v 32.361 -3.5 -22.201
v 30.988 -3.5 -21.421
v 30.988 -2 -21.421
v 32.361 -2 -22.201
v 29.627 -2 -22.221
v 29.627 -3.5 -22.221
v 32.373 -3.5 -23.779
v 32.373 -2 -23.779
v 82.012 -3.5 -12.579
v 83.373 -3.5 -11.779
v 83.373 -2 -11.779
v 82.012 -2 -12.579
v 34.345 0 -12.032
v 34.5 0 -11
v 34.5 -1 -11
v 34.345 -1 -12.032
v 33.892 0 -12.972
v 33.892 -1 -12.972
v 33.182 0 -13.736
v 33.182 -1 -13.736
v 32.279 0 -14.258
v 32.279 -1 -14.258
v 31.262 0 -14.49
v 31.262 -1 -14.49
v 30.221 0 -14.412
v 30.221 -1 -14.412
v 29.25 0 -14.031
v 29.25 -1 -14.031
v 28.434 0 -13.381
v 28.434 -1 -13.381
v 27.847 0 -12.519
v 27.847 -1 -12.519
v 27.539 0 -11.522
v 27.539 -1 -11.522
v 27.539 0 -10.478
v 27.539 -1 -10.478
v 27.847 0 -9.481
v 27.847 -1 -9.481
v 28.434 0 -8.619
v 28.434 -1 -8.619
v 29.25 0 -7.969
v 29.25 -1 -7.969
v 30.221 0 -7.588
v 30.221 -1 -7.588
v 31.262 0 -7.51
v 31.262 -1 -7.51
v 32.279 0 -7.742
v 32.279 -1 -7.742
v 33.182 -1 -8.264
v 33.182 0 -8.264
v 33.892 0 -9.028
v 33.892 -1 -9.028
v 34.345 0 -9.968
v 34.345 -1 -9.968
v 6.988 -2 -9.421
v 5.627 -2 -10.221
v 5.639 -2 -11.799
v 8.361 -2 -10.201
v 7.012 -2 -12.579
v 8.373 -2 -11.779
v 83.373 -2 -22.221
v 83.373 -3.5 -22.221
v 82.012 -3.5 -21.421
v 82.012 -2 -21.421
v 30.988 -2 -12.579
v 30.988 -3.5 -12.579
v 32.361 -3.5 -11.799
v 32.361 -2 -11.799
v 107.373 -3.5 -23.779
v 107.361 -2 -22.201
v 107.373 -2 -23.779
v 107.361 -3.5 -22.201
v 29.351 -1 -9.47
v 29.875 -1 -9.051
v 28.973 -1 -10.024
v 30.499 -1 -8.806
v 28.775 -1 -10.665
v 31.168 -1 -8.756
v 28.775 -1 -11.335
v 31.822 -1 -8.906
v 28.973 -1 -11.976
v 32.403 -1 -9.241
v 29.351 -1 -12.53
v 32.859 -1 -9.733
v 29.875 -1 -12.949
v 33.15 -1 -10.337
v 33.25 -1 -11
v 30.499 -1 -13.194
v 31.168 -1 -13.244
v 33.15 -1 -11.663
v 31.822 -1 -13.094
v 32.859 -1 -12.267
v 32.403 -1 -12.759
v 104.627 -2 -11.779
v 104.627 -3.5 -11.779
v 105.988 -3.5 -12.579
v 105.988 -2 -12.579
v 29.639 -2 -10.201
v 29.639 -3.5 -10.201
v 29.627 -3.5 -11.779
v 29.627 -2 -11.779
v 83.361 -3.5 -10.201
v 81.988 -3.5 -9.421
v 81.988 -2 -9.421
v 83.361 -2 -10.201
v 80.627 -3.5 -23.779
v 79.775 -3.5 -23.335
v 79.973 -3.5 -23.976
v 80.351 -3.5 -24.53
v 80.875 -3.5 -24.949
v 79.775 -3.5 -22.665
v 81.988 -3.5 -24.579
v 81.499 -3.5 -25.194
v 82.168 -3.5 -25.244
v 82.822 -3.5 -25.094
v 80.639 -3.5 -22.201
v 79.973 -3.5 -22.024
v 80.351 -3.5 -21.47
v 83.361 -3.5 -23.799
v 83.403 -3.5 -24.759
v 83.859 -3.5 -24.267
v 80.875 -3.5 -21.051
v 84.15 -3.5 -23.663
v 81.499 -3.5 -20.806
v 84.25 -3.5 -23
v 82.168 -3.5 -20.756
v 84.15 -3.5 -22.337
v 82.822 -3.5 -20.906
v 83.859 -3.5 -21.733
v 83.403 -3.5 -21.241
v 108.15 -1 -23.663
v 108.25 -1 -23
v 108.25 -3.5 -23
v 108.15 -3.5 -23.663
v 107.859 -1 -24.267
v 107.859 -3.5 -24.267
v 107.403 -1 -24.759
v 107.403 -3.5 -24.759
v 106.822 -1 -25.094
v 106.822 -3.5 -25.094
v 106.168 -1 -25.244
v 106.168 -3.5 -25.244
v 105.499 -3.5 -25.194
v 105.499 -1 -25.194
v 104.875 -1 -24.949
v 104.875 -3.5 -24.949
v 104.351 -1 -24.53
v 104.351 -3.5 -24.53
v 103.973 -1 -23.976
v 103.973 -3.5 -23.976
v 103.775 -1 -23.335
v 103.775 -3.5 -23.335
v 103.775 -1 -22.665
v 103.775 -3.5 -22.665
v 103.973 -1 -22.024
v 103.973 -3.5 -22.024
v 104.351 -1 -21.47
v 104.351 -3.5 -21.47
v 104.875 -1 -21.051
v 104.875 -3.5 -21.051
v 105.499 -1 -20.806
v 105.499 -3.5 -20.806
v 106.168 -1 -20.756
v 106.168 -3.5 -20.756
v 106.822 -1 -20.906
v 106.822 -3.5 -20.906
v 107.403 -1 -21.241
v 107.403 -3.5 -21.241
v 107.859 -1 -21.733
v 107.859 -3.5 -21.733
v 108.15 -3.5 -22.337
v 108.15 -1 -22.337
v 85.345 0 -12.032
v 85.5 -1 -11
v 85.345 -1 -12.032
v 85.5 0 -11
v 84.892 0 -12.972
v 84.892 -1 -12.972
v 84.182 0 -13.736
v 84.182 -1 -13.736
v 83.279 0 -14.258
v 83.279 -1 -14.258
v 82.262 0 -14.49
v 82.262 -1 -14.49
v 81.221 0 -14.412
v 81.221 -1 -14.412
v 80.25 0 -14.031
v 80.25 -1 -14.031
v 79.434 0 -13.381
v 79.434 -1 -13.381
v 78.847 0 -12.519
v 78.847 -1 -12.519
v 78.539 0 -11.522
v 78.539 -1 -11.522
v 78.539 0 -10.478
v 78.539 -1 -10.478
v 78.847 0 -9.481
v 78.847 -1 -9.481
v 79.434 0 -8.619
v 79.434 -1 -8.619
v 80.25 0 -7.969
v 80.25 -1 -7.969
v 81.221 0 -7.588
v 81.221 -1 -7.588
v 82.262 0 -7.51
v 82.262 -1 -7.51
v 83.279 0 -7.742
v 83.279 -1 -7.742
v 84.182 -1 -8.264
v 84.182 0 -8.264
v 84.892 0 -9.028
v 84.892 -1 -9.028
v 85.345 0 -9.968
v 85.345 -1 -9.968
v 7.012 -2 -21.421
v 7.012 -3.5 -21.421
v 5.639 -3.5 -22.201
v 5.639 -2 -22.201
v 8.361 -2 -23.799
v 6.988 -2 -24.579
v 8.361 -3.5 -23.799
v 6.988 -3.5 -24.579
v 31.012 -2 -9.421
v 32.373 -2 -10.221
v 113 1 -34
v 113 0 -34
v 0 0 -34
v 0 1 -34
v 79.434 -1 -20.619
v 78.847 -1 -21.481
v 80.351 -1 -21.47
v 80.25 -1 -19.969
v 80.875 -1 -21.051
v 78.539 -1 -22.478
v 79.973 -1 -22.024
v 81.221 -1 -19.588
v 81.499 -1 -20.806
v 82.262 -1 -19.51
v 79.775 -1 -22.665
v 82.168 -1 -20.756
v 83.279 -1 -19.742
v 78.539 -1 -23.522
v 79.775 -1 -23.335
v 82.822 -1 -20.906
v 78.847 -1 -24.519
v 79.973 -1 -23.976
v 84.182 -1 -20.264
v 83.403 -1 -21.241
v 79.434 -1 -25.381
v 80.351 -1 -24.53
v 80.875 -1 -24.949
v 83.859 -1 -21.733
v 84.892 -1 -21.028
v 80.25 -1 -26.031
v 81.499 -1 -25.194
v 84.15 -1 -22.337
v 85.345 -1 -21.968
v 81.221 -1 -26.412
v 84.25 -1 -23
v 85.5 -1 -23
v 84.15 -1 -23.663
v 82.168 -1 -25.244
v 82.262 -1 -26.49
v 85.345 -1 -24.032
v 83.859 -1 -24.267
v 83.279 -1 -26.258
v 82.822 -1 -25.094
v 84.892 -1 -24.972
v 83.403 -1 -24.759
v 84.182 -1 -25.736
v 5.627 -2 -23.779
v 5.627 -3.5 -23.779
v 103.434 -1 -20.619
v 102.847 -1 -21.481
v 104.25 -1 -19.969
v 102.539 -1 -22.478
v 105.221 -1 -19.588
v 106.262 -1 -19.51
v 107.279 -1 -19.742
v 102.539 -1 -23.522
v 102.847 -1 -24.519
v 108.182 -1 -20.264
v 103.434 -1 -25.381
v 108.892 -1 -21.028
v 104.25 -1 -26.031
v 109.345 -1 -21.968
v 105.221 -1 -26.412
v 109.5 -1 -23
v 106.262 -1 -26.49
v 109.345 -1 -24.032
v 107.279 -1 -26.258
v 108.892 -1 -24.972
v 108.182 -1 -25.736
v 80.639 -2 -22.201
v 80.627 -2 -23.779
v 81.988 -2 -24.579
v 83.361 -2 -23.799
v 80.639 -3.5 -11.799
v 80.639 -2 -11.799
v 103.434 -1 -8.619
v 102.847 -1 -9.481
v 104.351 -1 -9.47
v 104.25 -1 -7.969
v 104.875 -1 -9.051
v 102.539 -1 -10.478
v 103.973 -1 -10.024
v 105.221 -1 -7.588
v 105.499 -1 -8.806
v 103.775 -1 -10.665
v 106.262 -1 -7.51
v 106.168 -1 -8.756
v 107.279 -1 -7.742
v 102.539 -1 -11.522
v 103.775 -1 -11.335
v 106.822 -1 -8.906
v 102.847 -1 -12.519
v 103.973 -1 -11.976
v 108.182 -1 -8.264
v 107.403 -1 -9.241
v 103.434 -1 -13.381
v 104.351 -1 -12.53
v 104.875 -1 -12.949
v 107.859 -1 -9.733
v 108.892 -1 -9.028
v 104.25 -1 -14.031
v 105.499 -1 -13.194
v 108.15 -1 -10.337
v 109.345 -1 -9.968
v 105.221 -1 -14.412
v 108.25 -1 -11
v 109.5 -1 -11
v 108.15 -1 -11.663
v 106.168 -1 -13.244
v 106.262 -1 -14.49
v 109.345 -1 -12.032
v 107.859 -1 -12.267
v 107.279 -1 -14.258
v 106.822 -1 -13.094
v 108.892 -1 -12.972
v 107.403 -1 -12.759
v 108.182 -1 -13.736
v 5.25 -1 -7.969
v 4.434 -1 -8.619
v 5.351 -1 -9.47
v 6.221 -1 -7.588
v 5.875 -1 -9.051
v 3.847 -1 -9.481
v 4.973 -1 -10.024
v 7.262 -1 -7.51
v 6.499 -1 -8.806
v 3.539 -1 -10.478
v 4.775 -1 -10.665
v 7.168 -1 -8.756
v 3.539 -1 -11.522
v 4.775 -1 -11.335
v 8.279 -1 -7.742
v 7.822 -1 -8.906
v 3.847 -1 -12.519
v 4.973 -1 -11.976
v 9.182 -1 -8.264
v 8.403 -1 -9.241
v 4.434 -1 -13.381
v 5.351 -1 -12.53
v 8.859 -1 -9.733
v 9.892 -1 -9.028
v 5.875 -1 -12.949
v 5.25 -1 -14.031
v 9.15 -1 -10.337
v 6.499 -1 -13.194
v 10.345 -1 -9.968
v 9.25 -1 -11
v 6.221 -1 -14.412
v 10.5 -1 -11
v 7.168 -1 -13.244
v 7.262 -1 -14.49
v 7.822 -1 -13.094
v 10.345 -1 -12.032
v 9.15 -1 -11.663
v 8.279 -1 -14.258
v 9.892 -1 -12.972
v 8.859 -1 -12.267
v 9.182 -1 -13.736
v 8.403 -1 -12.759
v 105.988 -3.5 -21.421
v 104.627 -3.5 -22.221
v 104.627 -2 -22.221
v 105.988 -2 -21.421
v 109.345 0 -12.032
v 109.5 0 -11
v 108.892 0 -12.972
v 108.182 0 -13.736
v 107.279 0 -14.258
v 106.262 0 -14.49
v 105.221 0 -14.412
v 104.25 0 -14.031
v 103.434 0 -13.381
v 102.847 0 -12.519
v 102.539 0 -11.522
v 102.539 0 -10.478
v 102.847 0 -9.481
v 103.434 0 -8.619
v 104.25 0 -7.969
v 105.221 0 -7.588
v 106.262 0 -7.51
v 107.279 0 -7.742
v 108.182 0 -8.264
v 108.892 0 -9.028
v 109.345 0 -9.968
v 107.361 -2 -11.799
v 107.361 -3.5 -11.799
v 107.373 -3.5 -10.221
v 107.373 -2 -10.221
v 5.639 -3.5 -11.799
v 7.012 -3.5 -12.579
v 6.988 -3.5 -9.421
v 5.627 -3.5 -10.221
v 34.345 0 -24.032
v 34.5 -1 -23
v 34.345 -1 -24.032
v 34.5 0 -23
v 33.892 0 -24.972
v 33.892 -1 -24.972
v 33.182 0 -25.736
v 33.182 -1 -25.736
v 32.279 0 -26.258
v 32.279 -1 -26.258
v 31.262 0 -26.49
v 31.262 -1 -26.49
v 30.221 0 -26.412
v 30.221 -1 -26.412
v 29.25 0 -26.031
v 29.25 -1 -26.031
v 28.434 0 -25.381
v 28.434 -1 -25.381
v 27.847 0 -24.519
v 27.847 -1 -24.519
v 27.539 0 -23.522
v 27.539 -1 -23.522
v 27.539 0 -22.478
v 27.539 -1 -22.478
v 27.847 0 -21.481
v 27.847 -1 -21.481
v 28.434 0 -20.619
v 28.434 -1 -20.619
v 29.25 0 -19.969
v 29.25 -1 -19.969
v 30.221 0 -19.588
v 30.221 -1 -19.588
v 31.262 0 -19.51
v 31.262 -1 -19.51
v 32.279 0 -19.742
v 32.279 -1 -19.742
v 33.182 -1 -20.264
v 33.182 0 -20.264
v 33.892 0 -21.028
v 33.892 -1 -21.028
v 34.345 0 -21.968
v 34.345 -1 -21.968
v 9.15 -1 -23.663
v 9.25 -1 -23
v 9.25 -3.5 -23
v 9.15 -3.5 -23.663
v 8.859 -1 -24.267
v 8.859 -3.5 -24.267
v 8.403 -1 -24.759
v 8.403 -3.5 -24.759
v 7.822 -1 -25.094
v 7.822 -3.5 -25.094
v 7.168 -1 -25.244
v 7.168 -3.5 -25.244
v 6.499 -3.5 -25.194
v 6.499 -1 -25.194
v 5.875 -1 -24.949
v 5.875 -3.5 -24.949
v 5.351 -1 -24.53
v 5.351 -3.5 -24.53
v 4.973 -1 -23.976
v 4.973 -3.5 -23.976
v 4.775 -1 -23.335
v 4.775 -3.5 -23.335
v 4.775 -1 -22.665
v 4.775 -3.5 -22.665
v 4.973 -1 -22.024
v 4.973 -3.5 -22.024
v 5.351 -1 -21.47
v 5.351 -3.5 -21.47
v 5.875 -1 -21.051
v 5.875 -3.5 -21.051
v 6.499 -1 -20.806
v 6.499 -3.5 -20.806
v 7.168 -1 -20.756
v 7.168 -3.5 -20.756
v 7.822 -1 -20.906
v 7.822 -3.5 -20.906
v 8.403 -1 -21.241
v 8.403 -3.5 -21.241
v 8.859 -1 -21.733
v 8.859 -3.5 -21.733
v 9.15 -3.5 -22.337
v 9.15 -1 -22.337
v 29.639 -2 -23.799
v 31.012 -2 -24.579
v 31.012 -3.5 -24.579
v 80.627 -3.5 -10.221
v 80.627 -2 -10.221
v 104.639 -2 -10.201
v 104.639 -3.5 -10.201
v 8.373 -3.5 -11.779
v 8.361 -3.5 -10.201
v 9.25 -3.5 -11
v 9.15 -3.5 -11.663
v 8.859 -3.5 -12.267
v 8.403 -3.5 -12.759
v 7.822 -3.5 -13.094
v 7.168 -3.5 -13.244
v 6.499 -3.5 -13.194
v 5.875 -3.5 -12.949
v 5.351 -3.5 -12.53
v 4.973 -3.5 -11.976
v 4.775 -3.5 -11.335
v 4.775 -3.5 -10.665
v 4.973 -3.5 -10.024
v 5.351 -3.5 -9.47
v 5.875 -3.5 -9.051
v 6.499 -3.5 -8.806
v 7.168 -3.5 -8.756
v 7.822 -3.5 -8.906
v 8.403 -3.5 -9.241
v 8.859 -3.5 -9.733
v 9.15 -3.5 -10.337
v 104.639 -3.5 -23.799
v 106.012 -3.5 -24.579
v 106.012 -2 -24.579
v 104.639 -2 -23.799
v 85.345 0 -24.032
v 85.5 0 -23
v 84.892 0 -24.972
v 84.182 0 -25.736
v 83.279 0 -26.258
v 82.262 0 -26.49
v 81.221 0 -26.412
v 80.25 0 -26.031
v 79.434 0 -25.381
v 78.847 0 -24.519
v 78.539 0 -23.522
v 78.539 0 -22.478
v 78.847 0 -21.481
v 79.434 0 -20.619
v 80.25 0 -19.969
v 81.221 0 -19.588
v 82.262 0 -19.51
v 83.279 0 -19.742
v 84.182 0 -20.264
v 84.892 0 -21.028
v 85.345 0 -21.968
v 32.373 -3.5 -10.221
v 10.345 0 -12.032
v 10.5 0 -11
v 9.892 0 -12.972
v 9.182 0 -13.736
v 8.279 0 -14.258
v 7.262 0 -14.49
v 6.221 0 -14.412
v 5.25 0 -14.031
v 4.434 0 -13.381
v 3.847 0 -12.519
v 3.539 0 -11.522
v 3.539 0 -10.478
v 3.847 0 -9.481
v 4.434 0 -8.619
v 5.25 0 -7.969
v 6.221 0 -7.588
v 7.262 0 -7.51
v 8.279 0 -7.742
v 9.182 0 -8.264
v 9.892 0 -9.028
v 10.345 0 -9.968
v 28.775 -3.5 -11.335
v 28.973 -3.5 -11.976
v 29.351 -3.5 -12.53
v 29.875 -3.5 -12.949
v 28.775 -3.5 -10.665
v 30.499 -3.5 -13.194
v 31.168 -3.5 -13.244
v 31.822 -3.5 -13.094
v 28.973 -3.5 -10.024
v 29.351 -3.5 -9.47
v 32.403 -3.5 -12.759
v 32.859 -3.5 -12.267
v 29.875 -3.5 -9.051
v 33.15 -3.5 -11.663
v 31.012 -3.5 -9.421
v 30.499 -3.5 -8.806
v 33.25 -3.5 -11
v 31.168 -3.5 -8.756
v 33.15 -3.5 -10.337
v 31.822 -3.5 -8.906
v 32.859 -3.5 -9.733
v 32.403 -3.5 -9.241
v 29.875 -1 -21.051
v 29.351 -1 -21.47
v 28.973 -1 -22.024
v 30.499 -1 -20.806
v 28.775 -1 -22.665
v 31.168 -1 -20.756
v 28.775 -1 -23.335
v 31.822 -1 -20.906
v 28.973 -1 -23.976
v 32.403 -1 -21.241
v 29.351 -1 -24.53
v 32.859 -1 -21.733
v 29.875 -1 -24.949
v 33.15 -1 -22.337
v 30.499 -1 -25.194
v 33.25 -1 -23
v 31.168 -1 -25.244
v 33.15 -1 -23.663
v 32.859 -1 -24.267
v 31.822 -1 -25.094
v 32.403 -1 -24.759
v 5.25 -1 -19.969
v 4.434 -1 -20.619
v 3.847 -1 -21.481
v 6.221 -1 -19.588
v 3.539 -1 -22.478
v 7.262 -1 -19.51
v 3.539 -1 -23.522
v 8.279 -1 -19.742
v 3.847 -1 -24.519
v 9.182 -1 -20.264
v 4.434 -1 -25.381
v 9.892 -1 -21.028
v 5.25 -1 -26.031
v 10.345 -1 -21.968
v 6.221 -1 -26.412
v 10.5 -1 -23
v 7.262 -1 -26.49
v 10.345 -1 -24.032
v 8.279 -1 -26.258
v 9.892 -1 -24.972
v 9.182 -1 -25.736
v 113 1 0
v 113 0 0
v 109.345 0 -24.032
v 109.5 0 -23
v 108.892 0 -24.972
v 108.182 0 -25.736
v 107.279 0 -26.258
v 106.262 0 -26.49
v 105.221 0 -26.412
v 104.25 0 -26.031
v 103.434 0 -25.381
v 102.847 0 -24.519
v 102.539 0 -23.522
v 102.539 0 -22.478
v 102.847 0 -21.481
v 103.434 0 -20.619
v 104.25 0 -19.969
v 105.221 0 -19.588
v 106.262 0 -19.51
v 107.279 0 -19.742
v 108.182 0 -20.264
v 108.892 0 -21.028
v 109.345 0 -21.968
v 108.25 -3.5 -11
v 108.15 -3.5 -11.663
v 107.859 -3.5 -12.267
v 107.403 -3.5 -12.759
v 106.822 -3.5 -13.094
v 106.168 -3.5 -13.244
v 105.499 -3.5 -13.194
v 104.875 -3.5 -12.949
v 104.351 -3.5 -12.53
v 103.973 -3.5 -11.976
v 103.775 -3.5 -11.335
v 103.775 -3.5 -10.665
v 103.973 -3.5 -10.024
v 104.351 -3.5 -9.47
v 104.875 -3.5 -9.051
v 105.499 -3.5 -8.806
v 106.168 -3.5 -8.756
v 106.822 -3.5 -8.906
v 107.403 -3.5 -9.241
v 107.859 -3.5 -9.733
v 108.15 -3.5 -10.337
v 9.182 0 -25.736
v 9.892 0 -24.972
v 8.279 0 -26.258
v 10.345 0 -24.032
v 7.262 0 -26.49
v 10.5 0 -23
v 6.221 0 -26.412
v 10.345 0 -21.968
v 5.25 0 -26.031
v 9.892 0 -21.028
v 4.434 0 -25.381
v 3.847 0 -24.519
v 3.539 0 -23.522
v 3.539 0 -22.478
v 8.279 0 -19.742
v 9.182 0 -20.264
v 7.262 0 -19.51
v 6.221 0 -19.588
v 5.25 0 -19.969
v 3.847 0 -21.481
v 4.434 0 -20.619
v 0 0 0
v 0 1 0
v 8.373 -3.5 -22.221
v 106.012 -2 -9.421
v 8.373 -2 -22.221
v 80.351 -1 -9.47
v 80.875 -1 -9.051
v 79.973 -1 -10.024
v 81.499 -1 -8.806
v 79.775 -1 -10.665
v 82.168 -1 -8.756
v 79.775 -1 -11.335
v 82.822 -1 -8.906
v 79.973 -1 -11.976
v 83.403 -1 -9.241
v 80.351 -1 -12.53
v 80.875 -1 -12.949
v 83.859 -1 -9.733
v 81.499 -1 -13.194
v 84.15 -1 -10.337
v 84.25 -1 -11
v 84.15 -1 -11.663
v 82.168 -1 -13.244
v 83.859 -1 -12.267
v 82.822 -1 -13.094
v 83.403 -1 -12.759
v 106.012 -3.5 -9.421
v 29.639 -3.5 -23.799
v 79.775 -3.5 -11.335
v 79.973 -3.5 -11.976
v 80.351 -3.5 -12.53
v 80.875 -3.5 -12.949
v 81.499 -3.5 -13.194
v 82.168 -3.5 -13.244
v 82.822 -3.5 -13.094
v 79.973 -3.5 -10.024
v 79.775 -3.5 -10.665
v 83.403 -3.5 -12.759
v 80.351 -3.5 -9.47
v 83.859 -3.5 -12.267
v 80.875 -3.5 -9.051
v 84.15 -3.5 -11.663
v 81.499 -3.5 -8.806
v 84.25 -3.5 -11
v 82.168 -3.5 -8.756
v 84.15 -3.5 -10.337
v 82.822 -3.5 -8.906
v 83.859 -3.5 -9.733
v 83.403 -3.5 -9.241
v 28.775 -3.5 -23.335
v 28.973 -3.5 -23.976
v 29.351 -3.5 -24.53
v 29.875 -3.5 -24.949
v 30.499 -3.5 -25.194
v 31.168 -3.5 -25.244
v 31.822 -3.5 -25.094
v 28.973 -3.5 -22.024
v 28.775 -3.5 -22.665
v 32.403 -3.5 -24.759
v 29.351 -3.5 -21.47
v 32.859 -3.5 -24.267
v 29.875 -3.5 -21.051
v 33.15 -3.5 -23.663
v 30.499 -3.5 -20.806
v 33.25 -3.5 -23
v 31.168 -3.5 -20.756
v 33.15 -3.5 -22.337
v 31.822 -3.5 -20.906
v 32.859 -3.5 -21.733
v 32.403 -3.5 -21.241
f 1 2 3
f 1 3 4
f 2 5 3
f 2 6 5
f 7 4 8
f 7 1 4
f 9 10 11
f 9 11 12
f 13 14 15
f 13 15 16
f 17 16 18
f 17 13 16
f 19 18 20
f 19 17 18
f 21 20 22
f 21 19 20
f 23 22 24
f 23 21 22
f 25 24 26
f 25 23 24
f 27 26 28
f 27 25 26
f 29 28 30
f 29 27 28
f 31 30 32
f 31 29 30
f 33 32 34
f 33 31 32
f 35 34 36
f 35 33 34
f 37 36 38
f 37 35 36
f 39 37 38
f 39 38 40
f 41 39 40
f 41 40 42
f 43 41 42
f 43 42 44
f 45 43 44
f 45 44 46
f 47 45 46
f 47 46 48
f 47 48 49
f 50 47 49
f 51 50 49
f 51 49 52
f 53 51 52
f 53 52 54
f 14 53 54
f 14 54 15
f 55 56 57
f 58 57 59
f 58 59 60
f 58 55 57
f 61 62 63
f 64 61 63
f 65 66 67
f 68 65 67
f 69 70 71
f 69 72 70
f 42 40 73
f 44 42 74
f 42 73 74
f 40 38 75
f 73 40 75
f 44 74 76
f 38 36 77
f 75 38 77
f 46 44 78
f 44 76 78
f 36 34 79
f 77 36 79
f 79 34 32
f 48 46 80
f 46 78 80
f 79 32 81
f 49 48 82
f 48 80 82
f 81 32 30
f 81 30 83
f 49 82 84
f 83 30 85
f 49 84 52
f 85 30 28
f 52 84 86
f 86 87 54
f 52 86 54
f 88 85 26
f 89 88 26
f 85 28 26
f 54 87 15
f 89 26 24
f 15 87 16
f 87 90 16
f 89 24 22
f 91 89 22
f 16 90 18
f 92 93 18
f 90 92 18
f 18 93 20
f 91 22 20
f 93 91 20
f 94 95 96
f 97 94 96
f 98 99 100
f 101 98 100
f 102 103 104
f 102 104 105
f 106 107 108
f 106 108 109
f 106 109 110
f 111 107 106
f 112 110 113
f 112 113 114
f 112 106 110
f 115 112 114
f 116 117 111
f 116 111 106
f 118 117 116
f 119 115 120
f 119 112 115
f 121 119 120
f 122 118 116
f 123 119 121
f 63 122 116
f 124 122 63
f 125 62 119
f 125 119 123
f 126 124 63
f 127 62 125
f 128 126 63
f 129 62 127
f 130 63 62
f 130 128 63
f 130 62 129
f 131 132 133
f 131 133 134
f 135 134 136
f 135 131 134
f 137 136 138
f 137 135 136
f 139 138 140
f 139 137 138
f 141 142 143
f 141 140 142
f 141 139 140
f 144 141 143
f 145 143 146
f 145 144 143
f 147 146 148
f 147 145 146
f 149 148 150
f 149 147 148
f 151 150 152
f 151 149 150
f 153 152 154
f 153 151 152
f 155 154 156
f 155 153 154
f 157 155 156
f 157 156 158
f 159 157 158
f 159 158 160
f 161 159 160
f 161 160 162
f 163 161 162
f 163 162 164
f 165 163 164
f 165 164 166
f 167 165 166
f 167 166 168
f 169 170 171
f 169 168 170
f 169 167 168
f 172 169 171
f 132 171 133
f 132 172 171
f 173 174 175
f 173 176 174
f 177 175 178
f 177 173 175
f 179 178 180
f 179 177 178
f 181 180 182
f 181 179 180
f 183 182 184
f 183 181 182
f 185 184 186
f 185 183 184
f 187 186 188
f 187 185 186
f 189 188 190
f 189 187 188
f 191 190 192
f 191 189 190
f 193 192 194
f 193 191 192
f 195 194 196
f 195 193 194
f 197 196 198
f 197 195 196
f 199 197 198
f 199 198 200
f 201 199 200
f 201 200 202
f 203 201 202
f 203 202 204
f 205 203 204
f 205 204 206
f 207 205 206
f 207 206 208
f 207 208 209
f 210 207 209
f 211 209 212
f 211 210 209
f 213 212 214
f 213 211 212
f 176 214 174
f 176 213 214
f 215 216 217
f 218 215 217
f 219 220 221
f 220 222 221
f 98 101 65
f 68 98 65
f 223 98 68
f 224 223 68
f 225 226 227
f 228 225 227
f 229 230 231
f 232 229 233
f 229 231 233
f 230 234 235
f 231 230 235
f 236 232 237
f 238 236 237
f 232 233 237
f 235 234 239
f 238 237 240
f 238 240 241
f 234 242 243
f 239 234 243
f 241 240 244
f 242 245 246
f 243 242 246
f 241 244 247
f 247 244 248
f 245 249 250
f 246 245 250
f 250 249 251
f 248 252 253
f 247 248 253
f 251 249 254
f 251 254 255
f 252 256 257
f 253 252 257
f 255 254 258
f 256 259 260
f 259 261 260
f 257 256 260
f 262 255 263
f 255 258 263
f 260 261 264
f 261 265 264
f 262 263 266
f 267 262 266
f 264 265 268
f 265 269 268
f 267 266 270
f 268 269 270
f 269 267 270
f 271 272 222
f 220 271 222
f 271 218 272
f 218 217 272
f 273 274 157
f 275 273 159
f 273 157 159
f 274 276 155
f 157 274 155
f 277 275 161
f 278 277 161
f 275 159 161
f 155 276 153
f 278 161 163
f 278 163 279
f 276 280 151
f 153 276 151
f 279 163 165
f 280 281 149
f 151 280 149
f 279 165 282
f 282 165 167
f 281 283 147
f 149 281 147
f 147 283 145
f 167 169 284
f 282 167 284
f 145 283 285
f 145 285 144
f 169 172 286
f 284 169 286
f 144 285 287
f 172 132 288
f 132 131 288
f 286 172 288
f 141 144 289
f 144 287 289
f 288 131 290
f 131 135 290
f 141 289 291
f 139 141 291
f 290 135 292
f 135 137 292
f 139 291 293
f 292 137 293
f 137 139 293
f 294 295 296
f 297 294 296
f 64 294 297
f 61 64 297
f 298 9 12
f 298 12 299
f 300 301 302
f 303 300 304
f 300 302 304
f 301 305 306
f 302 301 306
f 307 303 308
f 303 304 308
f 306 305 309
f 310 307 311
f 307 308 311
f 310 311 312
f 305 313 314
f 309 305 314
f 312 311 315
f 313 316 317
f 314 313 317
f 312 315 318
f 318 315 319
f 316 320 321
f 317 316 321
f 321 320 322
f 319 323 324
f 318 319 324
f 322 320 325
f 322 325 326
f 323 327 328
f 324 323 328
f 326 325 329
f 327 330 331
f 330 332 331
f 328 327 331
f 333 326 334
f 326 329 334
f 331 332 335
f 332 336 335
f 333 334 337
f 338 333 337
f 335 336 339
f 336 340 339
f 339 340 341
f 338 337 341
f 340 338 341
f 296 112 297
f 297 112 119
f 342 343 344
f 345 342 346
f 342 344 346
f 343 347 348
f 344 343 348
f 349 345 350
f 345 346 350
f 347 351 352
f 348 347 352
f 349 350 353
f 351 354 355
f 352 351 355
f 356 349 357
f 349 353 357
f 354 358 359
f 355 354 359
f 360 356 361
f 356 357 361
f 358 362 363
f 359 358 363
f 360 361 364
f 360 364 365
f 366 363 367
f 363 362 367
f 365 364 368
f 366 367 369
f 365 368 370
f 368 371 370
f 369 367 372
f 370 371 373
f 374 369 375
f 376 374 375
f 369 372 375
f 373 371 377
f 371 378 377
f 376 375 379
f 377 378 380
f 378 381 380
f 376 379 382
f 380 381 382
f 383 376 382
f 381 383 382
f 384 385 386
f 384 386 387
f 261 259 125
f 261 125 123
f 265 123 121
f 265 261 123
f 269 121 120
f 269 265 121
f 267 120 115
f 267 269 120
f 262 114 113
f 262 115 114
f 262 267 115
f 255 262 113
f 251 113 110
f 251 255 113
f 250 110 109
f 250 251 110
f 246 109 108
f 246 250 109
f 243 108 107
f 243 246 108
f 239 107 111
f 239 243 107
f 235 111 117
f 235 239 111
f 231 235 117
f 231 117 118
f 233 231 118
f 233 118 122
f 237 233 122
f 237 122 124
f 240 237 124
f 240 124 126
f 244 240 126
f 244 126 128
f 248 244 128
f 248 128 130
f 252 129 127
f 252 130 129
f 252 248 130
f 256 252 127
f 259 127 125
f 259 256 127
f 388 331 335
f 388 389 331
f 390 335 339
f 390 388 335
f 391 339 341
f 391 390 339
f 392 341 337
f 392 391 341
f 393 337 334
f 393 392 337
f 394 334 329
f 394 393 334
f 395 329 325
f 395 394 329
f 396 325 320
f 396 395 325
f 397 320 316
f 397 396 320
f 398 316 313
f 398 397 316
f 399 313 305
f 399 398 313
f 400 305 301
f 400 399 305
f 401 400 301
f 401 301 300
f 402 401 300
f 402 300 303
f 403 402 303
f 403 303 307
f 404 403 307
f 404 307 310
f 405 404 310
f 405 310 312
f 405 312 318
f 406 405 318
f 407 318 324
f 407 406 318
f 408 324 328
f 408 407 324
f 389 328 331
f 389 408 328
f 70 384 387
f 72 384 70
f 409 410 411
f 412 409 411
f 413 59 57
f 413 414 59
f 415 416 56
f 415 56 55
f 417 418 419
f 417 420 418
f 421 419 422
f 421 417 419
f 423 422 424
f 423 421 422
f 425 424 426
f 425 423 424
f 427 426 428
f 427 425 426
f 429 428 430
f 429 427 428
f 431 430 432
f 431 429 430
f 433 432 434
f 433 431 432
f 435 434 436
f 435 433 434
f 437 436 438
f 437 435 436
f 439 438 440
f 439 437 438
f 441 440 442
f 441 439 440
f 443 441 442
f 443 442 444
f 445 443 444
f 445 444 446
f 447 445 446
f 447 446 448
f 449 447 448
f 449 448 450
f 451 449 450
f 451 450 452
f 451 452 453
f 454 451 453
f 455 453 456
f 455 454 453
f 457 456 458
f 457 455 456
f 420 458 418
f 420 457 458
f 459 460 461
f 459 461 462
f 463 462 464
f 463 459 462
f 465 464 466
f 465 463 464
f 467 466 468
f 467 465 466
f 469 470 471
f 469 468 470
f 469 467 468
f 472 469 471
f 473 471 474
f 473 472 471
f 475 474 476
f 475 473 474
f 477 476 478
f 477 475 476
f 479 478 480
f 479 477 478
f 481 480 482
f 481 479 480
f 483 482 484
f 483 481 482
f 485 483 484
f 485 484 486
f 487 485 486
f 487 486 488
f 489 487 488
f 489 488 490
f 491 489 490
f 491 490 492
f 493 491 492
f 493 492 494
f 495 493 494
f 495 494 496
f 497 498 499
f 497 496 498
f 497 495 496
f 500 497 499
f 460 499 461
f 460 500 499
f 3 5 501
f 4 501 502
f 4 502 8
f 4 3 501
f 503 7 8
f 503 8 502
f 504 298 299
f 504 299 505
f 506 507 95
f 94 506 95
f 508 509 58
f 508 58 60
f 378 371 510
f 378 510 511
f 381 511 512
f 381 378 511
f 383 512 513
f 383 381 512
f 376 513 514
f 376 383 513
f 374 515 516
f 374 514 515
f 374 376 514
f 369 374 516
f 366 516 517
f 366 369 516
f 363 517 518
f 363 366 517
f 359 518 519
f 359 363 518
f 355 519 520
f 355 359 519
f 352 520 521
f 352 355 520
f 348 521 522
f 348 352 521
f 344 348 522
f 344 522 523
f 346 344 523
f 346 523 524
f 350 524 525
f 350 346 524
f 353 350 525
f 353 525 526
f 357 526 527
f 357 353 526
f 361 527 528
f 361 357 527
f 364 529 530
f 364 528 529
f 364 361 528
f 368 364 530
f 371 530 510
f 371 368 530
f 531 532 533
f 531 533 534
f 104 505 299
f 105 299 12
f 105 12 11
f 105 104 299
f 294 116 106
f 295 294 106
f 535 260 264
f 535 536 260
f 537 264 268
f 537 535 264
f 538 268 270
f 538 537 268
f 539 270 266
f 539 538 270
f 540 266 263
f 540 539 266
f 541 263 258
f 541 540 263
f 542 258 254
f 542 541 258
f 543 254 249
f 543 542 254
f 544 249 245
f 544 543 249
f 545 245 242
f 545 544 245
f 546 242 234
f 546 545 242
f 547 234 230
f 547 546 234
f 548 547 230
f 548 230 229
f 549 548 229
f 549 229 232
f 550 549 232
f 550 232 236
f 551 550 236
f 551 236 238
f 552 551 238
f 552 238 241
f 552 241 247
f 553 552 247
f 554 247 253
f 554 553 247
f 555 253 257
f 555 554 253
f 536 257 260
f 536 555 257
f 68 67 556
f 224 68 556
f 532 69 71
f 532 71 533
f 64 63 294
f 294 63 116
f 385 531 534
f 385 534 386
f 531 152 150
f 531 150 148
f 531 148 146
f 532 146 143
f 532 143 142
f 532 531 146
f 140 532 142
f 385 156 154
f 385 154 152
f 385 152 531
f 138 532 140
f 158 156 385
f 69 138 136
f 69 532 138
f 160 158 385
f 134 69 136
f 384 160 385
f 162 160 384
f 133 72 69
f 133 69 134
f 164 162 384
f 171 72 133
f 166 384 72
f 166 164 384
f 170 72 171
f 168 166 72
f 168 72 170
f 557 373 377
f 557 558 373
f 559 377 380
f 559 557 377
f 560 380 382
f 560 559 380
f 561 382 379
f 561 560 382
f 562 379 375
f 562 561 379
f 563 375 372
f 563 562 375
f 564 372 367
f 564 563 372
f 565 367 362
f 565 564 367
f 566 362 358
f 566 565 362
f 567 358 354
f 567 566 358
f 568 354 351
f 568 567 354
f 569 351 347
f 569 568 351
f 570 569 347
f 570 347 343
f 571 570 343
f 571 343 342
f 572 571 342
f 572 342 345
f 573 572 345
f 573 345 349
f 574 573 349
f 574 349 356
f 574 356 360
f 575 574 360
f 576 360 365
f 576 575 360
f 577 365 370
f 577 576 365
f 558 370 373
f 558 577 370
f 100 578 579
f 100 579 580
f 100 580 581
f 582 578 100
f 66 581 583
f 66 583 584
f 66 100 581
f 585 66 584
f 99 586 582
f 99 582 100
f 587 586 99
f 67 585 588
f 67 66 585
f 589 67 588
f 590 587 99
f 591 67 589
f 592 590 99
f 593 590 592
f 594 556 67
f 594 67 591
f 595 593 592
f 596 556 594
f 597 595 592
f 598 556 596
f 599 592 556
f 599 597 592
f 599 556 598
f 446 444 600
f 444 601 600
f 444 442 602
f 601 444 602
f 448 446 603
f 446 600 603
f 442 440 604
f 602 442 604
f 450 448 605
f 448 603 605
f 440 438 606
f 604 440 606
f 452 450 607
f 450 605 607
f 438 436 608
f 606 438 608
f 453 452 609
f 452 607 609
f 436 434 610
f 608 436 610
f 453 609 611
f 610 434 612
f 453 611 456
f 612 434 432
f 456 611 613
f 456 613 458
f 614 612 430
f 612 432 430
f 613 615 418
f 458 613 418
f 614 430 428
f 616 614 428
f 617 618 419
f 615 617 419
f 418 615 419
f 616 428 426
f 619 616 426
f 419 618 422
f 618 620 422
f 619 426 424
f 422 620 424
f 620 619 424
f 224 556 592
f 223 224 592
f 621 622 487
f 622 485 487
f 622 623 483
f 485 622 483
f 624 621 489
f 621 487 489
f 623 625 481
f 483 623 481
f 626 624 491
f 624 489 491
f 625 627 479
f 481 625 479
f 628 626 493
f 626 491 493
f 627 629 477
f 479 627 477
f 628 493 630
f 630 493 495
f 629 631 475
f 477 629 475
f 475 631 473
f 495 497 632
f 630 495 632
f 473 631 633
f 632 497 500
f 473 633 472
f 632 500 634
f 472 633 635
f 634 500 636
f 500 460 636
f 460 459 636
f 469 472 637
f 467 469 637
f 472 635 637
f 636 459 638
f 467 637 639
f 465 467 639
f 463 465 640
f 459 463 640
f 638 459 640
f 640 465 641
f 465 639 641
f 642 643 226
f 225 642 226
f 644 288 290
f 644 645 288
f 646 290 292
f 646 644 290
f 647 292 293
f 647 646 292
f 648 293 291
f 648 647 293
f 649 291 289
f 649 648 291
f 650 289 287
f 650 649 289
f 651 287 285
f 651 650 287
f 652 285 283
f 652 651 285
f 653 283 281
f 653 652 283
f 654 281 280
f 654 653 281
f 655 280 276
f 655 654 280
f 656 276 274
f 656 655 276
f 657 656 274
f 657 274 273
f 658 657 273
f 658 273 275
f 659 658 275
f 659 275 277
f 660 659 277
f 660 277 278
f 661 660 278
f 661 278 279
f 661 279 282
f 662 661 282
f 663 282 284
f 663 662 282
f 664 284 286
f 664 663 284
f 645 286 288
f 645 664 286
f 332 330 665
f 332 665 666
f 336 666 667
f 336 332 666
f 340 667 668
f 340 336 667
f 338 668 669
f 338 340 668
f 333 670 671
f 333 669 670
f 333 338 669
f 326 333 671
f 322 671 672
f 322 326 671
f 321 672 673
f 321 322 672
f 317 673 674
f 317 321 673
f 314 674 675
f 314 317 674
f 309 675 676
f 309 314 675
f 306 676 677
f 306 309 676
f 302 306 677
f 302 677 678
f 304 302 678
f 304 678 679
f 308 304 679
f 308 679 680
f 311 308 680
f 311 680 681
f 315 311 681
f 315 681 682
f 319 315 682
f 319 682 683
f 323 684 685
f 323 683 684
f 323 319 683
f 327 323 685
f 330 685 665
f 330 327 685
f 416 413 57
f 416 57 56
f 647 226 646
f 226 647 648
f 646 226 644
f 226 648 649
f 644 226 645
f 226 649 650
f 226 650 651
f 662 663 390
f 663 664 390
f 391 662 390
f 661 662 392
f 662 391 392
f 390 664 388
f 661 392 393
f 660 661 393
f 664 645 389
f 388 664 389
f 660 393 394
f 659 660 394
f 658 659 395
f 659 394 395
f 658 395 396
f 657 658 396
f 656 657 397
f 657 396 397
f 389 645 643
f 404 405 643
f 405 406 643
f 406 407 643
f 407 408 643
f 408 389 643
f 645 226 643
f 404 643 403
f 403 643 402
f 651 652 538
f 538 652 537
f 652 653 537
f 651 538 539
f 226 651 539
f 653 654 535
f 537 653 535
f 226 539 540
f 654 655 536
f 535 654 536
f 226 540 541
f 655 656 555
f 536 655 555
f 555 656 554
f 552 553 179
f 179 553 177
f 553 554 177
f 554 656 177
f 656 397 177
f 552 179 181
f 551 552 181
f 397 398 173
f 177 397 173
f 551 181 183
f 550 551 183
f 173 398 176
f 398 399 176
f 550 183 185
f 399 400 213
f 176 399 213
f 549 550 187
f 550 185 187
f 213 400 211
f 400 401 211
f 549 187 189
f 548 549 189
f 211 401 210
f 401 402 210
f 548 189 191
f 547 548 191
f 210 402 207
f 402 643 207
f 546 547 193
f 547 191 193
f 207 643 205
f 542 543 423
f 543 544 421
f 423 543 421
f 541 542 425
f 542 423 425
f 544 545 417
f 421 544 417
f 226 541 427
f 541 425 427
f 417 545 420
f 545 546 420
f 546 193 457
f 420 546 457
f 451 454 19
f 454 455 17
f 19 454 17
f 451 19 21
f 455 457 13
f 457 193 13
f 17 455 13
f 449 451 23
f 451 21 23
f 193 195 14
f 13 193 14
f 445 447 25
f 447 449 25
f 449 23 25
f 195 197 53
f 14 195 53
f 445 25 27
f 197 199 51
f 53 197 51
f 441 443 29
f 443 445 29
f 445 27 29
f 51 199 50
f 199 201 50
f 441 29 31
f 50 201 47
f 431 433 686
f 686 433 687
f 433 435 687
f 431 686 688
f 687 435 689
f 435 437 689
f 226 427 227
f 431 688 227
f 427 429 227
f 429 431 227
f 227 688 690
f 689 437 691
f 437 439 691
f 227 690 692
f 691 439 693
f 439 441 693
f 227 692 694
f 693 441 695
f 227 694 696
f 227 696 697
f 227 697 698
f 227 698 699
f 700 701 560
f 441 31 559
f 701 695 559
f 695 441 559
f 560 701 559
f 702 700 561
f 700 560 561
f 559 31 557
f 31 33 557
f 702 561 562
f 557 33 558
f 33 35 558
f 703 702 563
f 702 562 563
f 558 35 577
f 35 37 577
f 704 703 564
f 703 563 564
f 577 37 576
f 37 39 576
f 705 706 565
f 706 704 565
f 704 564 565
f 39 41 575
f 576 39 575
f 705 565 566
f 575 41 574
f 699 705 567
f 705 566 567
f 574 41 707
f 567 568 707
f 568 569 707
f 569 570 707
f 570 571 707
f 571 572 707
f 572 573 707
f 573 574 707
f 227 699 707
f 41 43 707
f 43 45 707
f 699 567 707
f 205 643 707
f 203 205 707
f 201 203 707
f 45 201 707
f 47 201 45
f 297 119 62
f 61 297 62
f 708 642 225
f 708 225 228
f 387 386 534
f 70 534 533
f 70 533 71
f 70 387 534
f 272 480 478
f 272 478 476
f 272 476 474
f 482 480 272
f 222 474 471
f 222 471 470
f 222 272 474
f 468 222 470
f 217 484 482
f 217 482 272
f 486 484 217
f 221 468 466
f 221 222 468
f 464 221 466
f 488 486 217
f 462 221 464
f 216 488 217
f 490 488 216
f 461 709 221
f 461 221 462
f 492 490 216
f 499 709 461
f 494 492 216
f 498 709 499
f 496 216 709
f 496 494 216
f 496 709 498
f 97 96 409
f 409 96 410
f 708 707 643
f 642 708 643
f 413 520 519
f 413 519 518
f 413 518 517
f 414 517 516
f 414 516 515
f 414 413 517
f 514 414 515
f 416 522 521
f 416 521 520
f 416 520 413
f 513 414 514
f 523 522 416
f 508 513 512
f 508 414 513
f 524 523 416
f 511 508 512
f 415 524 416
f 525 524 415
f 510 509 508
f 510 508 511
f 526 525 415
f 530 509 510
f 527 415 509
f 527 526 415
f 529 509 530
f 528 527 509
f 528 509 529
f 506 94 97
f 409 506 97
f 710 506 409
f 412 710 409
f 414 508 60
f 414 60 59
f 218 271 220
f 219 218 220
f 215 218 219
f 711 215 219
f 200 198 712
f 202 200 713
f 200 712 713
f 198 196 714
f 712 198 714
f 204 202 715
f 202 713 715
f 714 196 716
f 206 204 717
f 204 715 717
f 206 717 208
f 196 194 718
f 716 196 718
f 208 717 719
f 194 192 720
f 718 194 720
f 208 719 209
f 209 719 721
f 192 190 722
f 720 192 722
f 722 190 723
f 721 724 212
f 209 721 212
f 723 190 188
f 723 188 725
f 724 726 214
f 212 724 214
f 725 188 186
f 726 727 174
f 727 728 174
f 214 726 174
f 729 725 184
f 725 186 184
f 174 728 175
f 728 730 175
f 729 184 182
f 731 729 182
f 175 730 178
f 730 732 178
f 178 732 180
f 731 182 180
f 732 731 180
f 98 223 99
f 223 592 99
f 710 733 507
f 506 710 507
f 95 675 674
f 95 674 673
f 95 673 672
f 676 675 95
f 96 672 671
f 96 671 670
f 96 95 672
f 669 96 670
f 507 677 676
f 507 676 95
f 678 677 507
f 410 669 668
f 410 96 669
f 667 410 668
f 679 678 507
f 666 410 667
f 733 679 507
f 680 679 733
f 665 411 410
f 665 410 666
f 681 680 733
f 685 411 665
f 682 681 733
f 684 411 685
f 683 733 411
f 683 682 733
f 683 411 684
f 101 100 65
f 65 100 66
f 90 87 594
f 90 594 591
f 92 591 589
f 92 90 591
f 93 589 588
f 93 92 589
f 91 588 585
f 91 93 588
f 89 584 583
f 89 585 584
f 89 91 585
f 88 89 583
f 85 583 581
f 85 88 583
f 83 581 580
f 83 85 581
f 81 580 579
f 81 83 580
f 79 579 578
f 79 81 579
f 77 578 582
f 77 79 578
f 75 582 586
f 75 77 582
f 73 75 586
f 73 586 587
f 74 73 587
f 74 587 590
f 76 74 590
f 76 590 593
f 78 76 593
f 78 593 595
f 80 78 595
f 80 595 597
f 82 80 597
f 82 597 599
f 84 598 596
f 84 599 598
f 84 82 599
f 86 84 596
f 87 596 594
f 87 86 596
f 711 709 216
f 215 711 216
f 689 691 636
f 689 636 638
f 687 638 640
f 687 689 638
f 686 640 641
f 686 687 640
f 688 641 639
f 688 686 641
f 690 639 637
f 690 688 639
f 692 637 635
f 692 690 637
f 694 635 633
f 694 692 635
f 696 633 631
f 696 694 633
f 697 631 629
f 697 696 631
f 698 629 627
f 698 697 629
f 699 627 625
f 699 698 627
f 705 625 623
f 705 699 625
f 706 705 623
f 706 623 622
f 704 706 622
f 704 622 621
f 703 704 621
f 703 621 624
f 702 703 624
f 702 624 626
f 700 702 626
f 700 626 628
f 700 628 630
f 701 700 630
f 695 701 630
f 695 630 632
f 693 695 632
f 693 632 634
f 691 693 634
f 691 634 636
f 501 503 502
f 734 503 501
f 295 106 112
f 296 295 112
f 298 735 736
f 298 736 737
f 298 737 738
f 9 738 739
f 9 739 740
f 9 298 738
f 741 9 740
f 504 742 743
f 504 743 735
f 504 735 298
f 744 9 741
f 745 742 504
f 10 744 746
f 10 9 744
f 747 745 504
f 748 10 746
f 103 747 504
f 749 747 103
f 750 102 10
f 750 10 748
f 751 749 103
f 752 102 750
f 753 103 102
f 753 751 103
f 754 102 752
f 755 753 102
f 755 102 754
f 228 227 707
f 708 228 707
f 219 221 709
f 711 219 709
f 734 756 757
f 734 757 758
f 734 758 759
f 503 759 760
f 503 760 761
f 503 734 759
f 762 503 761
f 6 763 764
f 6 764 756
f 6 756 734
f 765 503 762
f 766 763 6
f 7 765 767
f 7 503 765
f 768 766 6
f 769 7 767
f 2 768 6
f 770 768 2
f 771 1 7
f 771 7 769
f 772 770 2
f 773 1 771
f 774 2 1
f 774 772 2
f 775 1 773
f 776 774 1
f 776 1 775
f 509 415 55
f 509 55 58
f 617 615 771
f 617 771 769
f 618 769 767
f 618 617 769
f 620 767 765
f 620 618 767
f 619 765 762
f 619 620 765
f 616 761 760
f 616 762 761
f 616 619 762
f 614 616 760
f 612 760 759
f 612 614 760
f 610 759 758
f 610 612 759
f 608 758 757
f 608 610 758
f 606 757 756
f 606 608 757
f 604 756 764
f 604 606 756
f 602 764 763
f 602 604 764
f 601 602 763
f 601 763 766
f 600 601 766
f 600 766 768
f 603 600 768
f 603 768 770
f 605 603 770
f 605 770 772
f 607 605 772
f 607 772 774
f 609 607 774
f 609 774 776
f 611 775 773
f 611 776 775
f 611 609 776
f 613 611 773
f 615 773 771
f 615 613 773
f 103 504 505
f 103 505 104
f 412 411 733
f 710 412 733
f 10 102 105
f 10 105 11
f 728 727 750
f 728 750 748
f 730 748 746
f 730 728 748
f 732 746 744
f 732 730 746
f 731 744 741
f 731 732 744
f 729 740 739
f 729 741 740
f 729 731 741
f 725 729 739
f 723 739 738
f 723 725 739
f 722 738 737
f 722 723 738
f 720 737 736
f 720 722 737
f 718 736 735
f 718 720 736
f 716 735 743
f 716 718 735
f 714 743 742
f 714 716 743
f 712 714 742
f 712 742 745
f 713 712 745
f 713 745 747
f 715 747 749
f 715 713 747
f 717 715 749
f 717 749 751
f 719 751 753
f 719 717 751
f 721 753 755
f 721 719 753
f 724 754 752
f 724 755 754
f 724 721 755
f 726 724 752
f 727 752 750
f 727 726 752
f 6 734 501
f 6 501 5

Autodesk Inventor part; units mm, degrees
ref_plane "YZ Plane" through (0, 0, 0) normal (1, 0, 0) x (0, 1, 0)
ref_plane "XZ Plane" through (0, 0, 0) normal (0, 1, 0) x (-1, 0, 0)
ref_plane "XY Plane" through (0, 0, 0) normal (0, 0, 1) x (1, 0, 0)
sketch "Esboço1" plane through (0, 0, 0) normal (0, 1, 0) x (-1, 0, 0)
  line L0 (0, 0) -> (-113, 0)
  line L1 (-113, 0) -> (-113, -34)
  line L2 (-113, -34) -> (0, -34)
  line L3 (0, -34) -> (0, 0)
  line L4 (0, 0) -> (-7, 0)
  line L5 (0, -11) -> (0, 0)
  circle A0 centre (-7, -11) radius 2.25
  circle A1 centre (-7, -23) radius 2.25
  circle A2 centre (-31, -11) radius 2.25
  circle A3 centre (-31, -23) radius 2.25
  line L6 (-56.5, 0) -> (-56.5, -13.25)
  circle A4 centre (-106, -11) radius 2.25
  circle A5 centre (-106, -23) radius 2.25
  circle A6 centre (-82, -23) radius 2.25
  circle A7 centre (-82, -11) radius 2.25
  circle A8 centre (-7, -11) radius 3.5
  circle A9 centre (-7, -23) radius 3.5
  circle A10 centre (-31, -23) radius 3.5
  circle A11 centre (-31, -11) radius 3.5
  circle A12 centre (-106, -11) radius 3.5
  circle A13 centre (-106, -23) radius 3.5
  circle A14 centre (-82, -23) radius 3.5
  circle A15 centre (-82, -11) radius 3.5
  dimension "d0" = 113
  dimension "d1" = 34
  dimension "d6" = 7
  dimension "d7" = 7
  dimension "d8" = 7
  dimension "d9" = 7
extrude "Extrusão1" add sketch "Esboço1" along normal blind 1 contours L3 L2 L1 L0
sketch "Esboço2" plane through (0, 1, 0) normal (0, 1, 0) x (1, 0, 0)
  circle A0 centre (7, 11) radius 3.5 projected
  circle A1 centre (7, 11) radius 3.5
  circle A2 centre (7, 23) radius 3.5 projected
  circle A3 centre (7, 23) radius 3.5
  circle A4 centre (31, 23) radius 3.5 projected
  circle A5 centre (31, 23) radius 3.5
  circle A6 centre (31, 11) radius 3.5 projected
  circle A7 centre (31, 11) radius 3.5
  circle A8 centre (82, 23) radius 3.5 projected
  circle A9 centre (82, 23) radius 3.5
  circle A10 centre (106, 23) radius 3.5 projected
  circle A11 centre (106, 23) radius 3.5
  circle A12 centre (106, 11) radius 3.5 projected
  circle A13 centre (106, 11) radius 3.5
  circle A14 centre (82, 11) radius 3.5 projected
  circle A15 centre (82, 11) radius 3.5
  point P0 (0, 0)
extrude "Extrusão2" add sketch "Esboço2" against normal blind 2 contours A0 | A2 | A4 | A6 | A8 | A14
sketch "Esboço3" plane through (0, 1, 0) normal (0, 1, 0) x (1, 0, 0)
  circle A0 centre (106, 11) radius 3.5 projected
  circle A1 centre (106, 11) radius 3.5
  circle A2 centre (106, 23) radius 3.5 projected
  circle A3 centre (106, 23) radius 3.5
  point P0 (0, 0)
extrude "Extrusão3" add sketch "Esboço3" against normal blind 2
sketch "Esboço4" plane through (7, -1, -11) normal (0, -1, 0) x (1, 0, 0)
  circle A0 centre (0, 0) radius 3.5 projected
  circle A1 centre (0, 0) radius 2.25
  line L0 (106, -23) -> (-7, -23) projected
  line L1 (49.5, -23) -> (49.5, -11.349)
  line L2 (0, -23) -> (12, -23)
  line L3 (12, -23) -> (12, -13.2533)
  line L4 (-7, -23) -> (-7, 11) projected
  line L5 (-7, -6) -> (6, -6)
  circle A2 centre (0, -12) radius 2.25
  circle A3 centre (24, 0) radius 2.25
  circle A4 centre (24, -12) radius 2.25
  circle A5 centre (99, 0) radius 2.25
  circle A6 centre (99, -12) radius 2.25
  circle A7 centre (75, 0) radius 2.25
  circle A8 centre (75, -12) radius 2.25
  dimension "d16" = 4.5
  dimension "d17" = 12
extrude "Extrusão4" add sketch "Esboço4" along normal blind 2.5 contours A1 | A2 | A3 | A4 | A5 | A6 | A7 | A8
sketch "Esboço5" plane through (7, -3.5, -11) normal (0, -1, 0) x (1, 0, 0)
  line L0 (0.0116, -1.5787) -> (-1.3614, -0.7993)
  line L1 (-1.3614, -0.7993) -> (-1.373, 0.7793)
  line L2 (-1.373, 0.7793) -> (-0.0116, 1.5787)
  line L3 (-0.0116, 1.5787) -> (1.3614, 0.7993)
  line L4 (1.3614, 0.7993) -> (1.373, -0.7793)
  line L5 (1.373, -0.7793) -> (0.0116, -1.5787)
  line L6 (-7, -23) -> (-7, 11) projected
  circle A0 centre (0, -12) radius 3.5 projected
  line L7 (106, -23) -> (-7, -23) projected
  line L8 (0.0116, -10.4213) -> (-1.3614, -11.2007)
  line L9 (-1.3614, -11.2007) -> (-1.373, -12.7793)
  line L10 (-1.373, -12.7793) -> (-0.0116, -13.5787)
  line L11 (-0.0116, -13.5787) -> (1.3614, -12.7993)
  line L12 (1.3614, -12.7993) -> (1.373, -11.2207)
  line L13 (1.373, -11.2207) -> (0.0116, -10.4213)
  line L14 (23.9884, -1.5787) -> (25.3614, -0.7993)
  line L15 (25.3614, -0.7993) -> (25.373, 0.7793)
  line L16 (25.373, 0.7793) -> (24.0116, 1.5787)
  line L17 (24.0116, 1.5787) -> (22.6386, 0.7993)
  line L18 (22.6386, 0.7993) -> (22.627, -0.7793)
  line L19 (22.627, -0.7793) -> (23.9884, -1.5787)
  line L20 (23.9884, -10.4213) -> (25.3614, -11.2007)
  line L21 (25.3614, -11.2007) -> (25.373, -12.7793)
  line L22 (25.373, -12.7793) -> (24.0116, -13.5787)
  line L23 (22.6386, -12.7993) -> (22.627, -11.2207)
  line L24 (22.627, -11.2207) -> (23.9884, -10.4213)
  line L25 (24.0116, -13.5787) -> (22.6386, -12.7993)
  line L26 (98.9884, -1.5787) -> (100.3614, -0.7993)
  line L27 (100.3614, -0.7993) -> (100.373, 0.7793)
  line L28 (100.373, 0.7793) -> (99.0116, 1.5787)
  line L29 (99.0116, 1.5787) -> (97.6386, 0.7993)
  line L30 (97.6386, 0.7993) -> (97.627, -0.7793)
  line L31 (97.627, -0.7793) -> (98.9884, -1.5787)
  line L32 (98.9884, -10.4213) -> (100.3614, -11.2007)
  line L33 (100.3614, -11.2007) -> (100.373, -12.7793)
  line L34 (100.373, -12.7793) -> (99.0116, -13.5787)
  line L35 (97.6386, -12.7993) -> (97.627, -11.2207)
  line L36 (97.627, -11.2207) -> (98.9884, -10.4213)
  line L37 (99.0116, -13.5787) -> (97.6386, -12.7993)
  line L38 (75.0116, -10.4213) -> (73.6386, -11.2007)
  line L39 (76.373, -11.2207) -> (75.0116, -10.4213)
  line L40 (73.6386, -11.2007) -> (73.627, -12.7793)
  line L41 (76.3614, -12.7993) -> (76.373, -11.2207)
  line L42 (74.9884, -13.5787) -> (76.3614, -12.7993)
  line L43 (73.627, -12.7793) -> (74.9884, -13.5787)
  line L44 (76.373, -0.7793) -> (75.0116, -1.5787)
  line L45 (73.6386, -0.7993) -> (73.627, 0.7793)
  line L46 (76.3614, 0.7993) -> (76.373, -0.7793)
  line L47 (73.627, 0.7793) -> (74.9884, 1.5787)
  line L48 (74.9884, 1.5787) -> (76.3614, 0.7993)
  line L49 (75.0116, -1.5787) -> (73.6386, -0.7993)
  point P0 (0, 0)
  point P1 (24, 0)
  point P2 (24, -12)
  point P3 (99, 0)
  point P4 (75, 0)
  point P5 (75, -12)
extrude "Extrusão5" cut sketch "Esboço5" against normal blind 1.5 contours L0 L1 L2 L3 L4 L5 | L13 L12 L11 L10 L9 L8 | L19 L18 L17 L16 L15 L14 | L20 L21 L22 L25 L23 L24 | L31 L30 L29 L28 L27 L26 | L32 L33 L34 L37 L35 L36 | L39 L41 L42 L43 L40 L38 | L44 L49 L45 L47 L48 L46
sketch "Esboço6" plane through (0, 0, 0) normal (0, -1, 0) x (1, 0, 0)
  point P0 (0, 0)
properties part number "chapinha_garra"
